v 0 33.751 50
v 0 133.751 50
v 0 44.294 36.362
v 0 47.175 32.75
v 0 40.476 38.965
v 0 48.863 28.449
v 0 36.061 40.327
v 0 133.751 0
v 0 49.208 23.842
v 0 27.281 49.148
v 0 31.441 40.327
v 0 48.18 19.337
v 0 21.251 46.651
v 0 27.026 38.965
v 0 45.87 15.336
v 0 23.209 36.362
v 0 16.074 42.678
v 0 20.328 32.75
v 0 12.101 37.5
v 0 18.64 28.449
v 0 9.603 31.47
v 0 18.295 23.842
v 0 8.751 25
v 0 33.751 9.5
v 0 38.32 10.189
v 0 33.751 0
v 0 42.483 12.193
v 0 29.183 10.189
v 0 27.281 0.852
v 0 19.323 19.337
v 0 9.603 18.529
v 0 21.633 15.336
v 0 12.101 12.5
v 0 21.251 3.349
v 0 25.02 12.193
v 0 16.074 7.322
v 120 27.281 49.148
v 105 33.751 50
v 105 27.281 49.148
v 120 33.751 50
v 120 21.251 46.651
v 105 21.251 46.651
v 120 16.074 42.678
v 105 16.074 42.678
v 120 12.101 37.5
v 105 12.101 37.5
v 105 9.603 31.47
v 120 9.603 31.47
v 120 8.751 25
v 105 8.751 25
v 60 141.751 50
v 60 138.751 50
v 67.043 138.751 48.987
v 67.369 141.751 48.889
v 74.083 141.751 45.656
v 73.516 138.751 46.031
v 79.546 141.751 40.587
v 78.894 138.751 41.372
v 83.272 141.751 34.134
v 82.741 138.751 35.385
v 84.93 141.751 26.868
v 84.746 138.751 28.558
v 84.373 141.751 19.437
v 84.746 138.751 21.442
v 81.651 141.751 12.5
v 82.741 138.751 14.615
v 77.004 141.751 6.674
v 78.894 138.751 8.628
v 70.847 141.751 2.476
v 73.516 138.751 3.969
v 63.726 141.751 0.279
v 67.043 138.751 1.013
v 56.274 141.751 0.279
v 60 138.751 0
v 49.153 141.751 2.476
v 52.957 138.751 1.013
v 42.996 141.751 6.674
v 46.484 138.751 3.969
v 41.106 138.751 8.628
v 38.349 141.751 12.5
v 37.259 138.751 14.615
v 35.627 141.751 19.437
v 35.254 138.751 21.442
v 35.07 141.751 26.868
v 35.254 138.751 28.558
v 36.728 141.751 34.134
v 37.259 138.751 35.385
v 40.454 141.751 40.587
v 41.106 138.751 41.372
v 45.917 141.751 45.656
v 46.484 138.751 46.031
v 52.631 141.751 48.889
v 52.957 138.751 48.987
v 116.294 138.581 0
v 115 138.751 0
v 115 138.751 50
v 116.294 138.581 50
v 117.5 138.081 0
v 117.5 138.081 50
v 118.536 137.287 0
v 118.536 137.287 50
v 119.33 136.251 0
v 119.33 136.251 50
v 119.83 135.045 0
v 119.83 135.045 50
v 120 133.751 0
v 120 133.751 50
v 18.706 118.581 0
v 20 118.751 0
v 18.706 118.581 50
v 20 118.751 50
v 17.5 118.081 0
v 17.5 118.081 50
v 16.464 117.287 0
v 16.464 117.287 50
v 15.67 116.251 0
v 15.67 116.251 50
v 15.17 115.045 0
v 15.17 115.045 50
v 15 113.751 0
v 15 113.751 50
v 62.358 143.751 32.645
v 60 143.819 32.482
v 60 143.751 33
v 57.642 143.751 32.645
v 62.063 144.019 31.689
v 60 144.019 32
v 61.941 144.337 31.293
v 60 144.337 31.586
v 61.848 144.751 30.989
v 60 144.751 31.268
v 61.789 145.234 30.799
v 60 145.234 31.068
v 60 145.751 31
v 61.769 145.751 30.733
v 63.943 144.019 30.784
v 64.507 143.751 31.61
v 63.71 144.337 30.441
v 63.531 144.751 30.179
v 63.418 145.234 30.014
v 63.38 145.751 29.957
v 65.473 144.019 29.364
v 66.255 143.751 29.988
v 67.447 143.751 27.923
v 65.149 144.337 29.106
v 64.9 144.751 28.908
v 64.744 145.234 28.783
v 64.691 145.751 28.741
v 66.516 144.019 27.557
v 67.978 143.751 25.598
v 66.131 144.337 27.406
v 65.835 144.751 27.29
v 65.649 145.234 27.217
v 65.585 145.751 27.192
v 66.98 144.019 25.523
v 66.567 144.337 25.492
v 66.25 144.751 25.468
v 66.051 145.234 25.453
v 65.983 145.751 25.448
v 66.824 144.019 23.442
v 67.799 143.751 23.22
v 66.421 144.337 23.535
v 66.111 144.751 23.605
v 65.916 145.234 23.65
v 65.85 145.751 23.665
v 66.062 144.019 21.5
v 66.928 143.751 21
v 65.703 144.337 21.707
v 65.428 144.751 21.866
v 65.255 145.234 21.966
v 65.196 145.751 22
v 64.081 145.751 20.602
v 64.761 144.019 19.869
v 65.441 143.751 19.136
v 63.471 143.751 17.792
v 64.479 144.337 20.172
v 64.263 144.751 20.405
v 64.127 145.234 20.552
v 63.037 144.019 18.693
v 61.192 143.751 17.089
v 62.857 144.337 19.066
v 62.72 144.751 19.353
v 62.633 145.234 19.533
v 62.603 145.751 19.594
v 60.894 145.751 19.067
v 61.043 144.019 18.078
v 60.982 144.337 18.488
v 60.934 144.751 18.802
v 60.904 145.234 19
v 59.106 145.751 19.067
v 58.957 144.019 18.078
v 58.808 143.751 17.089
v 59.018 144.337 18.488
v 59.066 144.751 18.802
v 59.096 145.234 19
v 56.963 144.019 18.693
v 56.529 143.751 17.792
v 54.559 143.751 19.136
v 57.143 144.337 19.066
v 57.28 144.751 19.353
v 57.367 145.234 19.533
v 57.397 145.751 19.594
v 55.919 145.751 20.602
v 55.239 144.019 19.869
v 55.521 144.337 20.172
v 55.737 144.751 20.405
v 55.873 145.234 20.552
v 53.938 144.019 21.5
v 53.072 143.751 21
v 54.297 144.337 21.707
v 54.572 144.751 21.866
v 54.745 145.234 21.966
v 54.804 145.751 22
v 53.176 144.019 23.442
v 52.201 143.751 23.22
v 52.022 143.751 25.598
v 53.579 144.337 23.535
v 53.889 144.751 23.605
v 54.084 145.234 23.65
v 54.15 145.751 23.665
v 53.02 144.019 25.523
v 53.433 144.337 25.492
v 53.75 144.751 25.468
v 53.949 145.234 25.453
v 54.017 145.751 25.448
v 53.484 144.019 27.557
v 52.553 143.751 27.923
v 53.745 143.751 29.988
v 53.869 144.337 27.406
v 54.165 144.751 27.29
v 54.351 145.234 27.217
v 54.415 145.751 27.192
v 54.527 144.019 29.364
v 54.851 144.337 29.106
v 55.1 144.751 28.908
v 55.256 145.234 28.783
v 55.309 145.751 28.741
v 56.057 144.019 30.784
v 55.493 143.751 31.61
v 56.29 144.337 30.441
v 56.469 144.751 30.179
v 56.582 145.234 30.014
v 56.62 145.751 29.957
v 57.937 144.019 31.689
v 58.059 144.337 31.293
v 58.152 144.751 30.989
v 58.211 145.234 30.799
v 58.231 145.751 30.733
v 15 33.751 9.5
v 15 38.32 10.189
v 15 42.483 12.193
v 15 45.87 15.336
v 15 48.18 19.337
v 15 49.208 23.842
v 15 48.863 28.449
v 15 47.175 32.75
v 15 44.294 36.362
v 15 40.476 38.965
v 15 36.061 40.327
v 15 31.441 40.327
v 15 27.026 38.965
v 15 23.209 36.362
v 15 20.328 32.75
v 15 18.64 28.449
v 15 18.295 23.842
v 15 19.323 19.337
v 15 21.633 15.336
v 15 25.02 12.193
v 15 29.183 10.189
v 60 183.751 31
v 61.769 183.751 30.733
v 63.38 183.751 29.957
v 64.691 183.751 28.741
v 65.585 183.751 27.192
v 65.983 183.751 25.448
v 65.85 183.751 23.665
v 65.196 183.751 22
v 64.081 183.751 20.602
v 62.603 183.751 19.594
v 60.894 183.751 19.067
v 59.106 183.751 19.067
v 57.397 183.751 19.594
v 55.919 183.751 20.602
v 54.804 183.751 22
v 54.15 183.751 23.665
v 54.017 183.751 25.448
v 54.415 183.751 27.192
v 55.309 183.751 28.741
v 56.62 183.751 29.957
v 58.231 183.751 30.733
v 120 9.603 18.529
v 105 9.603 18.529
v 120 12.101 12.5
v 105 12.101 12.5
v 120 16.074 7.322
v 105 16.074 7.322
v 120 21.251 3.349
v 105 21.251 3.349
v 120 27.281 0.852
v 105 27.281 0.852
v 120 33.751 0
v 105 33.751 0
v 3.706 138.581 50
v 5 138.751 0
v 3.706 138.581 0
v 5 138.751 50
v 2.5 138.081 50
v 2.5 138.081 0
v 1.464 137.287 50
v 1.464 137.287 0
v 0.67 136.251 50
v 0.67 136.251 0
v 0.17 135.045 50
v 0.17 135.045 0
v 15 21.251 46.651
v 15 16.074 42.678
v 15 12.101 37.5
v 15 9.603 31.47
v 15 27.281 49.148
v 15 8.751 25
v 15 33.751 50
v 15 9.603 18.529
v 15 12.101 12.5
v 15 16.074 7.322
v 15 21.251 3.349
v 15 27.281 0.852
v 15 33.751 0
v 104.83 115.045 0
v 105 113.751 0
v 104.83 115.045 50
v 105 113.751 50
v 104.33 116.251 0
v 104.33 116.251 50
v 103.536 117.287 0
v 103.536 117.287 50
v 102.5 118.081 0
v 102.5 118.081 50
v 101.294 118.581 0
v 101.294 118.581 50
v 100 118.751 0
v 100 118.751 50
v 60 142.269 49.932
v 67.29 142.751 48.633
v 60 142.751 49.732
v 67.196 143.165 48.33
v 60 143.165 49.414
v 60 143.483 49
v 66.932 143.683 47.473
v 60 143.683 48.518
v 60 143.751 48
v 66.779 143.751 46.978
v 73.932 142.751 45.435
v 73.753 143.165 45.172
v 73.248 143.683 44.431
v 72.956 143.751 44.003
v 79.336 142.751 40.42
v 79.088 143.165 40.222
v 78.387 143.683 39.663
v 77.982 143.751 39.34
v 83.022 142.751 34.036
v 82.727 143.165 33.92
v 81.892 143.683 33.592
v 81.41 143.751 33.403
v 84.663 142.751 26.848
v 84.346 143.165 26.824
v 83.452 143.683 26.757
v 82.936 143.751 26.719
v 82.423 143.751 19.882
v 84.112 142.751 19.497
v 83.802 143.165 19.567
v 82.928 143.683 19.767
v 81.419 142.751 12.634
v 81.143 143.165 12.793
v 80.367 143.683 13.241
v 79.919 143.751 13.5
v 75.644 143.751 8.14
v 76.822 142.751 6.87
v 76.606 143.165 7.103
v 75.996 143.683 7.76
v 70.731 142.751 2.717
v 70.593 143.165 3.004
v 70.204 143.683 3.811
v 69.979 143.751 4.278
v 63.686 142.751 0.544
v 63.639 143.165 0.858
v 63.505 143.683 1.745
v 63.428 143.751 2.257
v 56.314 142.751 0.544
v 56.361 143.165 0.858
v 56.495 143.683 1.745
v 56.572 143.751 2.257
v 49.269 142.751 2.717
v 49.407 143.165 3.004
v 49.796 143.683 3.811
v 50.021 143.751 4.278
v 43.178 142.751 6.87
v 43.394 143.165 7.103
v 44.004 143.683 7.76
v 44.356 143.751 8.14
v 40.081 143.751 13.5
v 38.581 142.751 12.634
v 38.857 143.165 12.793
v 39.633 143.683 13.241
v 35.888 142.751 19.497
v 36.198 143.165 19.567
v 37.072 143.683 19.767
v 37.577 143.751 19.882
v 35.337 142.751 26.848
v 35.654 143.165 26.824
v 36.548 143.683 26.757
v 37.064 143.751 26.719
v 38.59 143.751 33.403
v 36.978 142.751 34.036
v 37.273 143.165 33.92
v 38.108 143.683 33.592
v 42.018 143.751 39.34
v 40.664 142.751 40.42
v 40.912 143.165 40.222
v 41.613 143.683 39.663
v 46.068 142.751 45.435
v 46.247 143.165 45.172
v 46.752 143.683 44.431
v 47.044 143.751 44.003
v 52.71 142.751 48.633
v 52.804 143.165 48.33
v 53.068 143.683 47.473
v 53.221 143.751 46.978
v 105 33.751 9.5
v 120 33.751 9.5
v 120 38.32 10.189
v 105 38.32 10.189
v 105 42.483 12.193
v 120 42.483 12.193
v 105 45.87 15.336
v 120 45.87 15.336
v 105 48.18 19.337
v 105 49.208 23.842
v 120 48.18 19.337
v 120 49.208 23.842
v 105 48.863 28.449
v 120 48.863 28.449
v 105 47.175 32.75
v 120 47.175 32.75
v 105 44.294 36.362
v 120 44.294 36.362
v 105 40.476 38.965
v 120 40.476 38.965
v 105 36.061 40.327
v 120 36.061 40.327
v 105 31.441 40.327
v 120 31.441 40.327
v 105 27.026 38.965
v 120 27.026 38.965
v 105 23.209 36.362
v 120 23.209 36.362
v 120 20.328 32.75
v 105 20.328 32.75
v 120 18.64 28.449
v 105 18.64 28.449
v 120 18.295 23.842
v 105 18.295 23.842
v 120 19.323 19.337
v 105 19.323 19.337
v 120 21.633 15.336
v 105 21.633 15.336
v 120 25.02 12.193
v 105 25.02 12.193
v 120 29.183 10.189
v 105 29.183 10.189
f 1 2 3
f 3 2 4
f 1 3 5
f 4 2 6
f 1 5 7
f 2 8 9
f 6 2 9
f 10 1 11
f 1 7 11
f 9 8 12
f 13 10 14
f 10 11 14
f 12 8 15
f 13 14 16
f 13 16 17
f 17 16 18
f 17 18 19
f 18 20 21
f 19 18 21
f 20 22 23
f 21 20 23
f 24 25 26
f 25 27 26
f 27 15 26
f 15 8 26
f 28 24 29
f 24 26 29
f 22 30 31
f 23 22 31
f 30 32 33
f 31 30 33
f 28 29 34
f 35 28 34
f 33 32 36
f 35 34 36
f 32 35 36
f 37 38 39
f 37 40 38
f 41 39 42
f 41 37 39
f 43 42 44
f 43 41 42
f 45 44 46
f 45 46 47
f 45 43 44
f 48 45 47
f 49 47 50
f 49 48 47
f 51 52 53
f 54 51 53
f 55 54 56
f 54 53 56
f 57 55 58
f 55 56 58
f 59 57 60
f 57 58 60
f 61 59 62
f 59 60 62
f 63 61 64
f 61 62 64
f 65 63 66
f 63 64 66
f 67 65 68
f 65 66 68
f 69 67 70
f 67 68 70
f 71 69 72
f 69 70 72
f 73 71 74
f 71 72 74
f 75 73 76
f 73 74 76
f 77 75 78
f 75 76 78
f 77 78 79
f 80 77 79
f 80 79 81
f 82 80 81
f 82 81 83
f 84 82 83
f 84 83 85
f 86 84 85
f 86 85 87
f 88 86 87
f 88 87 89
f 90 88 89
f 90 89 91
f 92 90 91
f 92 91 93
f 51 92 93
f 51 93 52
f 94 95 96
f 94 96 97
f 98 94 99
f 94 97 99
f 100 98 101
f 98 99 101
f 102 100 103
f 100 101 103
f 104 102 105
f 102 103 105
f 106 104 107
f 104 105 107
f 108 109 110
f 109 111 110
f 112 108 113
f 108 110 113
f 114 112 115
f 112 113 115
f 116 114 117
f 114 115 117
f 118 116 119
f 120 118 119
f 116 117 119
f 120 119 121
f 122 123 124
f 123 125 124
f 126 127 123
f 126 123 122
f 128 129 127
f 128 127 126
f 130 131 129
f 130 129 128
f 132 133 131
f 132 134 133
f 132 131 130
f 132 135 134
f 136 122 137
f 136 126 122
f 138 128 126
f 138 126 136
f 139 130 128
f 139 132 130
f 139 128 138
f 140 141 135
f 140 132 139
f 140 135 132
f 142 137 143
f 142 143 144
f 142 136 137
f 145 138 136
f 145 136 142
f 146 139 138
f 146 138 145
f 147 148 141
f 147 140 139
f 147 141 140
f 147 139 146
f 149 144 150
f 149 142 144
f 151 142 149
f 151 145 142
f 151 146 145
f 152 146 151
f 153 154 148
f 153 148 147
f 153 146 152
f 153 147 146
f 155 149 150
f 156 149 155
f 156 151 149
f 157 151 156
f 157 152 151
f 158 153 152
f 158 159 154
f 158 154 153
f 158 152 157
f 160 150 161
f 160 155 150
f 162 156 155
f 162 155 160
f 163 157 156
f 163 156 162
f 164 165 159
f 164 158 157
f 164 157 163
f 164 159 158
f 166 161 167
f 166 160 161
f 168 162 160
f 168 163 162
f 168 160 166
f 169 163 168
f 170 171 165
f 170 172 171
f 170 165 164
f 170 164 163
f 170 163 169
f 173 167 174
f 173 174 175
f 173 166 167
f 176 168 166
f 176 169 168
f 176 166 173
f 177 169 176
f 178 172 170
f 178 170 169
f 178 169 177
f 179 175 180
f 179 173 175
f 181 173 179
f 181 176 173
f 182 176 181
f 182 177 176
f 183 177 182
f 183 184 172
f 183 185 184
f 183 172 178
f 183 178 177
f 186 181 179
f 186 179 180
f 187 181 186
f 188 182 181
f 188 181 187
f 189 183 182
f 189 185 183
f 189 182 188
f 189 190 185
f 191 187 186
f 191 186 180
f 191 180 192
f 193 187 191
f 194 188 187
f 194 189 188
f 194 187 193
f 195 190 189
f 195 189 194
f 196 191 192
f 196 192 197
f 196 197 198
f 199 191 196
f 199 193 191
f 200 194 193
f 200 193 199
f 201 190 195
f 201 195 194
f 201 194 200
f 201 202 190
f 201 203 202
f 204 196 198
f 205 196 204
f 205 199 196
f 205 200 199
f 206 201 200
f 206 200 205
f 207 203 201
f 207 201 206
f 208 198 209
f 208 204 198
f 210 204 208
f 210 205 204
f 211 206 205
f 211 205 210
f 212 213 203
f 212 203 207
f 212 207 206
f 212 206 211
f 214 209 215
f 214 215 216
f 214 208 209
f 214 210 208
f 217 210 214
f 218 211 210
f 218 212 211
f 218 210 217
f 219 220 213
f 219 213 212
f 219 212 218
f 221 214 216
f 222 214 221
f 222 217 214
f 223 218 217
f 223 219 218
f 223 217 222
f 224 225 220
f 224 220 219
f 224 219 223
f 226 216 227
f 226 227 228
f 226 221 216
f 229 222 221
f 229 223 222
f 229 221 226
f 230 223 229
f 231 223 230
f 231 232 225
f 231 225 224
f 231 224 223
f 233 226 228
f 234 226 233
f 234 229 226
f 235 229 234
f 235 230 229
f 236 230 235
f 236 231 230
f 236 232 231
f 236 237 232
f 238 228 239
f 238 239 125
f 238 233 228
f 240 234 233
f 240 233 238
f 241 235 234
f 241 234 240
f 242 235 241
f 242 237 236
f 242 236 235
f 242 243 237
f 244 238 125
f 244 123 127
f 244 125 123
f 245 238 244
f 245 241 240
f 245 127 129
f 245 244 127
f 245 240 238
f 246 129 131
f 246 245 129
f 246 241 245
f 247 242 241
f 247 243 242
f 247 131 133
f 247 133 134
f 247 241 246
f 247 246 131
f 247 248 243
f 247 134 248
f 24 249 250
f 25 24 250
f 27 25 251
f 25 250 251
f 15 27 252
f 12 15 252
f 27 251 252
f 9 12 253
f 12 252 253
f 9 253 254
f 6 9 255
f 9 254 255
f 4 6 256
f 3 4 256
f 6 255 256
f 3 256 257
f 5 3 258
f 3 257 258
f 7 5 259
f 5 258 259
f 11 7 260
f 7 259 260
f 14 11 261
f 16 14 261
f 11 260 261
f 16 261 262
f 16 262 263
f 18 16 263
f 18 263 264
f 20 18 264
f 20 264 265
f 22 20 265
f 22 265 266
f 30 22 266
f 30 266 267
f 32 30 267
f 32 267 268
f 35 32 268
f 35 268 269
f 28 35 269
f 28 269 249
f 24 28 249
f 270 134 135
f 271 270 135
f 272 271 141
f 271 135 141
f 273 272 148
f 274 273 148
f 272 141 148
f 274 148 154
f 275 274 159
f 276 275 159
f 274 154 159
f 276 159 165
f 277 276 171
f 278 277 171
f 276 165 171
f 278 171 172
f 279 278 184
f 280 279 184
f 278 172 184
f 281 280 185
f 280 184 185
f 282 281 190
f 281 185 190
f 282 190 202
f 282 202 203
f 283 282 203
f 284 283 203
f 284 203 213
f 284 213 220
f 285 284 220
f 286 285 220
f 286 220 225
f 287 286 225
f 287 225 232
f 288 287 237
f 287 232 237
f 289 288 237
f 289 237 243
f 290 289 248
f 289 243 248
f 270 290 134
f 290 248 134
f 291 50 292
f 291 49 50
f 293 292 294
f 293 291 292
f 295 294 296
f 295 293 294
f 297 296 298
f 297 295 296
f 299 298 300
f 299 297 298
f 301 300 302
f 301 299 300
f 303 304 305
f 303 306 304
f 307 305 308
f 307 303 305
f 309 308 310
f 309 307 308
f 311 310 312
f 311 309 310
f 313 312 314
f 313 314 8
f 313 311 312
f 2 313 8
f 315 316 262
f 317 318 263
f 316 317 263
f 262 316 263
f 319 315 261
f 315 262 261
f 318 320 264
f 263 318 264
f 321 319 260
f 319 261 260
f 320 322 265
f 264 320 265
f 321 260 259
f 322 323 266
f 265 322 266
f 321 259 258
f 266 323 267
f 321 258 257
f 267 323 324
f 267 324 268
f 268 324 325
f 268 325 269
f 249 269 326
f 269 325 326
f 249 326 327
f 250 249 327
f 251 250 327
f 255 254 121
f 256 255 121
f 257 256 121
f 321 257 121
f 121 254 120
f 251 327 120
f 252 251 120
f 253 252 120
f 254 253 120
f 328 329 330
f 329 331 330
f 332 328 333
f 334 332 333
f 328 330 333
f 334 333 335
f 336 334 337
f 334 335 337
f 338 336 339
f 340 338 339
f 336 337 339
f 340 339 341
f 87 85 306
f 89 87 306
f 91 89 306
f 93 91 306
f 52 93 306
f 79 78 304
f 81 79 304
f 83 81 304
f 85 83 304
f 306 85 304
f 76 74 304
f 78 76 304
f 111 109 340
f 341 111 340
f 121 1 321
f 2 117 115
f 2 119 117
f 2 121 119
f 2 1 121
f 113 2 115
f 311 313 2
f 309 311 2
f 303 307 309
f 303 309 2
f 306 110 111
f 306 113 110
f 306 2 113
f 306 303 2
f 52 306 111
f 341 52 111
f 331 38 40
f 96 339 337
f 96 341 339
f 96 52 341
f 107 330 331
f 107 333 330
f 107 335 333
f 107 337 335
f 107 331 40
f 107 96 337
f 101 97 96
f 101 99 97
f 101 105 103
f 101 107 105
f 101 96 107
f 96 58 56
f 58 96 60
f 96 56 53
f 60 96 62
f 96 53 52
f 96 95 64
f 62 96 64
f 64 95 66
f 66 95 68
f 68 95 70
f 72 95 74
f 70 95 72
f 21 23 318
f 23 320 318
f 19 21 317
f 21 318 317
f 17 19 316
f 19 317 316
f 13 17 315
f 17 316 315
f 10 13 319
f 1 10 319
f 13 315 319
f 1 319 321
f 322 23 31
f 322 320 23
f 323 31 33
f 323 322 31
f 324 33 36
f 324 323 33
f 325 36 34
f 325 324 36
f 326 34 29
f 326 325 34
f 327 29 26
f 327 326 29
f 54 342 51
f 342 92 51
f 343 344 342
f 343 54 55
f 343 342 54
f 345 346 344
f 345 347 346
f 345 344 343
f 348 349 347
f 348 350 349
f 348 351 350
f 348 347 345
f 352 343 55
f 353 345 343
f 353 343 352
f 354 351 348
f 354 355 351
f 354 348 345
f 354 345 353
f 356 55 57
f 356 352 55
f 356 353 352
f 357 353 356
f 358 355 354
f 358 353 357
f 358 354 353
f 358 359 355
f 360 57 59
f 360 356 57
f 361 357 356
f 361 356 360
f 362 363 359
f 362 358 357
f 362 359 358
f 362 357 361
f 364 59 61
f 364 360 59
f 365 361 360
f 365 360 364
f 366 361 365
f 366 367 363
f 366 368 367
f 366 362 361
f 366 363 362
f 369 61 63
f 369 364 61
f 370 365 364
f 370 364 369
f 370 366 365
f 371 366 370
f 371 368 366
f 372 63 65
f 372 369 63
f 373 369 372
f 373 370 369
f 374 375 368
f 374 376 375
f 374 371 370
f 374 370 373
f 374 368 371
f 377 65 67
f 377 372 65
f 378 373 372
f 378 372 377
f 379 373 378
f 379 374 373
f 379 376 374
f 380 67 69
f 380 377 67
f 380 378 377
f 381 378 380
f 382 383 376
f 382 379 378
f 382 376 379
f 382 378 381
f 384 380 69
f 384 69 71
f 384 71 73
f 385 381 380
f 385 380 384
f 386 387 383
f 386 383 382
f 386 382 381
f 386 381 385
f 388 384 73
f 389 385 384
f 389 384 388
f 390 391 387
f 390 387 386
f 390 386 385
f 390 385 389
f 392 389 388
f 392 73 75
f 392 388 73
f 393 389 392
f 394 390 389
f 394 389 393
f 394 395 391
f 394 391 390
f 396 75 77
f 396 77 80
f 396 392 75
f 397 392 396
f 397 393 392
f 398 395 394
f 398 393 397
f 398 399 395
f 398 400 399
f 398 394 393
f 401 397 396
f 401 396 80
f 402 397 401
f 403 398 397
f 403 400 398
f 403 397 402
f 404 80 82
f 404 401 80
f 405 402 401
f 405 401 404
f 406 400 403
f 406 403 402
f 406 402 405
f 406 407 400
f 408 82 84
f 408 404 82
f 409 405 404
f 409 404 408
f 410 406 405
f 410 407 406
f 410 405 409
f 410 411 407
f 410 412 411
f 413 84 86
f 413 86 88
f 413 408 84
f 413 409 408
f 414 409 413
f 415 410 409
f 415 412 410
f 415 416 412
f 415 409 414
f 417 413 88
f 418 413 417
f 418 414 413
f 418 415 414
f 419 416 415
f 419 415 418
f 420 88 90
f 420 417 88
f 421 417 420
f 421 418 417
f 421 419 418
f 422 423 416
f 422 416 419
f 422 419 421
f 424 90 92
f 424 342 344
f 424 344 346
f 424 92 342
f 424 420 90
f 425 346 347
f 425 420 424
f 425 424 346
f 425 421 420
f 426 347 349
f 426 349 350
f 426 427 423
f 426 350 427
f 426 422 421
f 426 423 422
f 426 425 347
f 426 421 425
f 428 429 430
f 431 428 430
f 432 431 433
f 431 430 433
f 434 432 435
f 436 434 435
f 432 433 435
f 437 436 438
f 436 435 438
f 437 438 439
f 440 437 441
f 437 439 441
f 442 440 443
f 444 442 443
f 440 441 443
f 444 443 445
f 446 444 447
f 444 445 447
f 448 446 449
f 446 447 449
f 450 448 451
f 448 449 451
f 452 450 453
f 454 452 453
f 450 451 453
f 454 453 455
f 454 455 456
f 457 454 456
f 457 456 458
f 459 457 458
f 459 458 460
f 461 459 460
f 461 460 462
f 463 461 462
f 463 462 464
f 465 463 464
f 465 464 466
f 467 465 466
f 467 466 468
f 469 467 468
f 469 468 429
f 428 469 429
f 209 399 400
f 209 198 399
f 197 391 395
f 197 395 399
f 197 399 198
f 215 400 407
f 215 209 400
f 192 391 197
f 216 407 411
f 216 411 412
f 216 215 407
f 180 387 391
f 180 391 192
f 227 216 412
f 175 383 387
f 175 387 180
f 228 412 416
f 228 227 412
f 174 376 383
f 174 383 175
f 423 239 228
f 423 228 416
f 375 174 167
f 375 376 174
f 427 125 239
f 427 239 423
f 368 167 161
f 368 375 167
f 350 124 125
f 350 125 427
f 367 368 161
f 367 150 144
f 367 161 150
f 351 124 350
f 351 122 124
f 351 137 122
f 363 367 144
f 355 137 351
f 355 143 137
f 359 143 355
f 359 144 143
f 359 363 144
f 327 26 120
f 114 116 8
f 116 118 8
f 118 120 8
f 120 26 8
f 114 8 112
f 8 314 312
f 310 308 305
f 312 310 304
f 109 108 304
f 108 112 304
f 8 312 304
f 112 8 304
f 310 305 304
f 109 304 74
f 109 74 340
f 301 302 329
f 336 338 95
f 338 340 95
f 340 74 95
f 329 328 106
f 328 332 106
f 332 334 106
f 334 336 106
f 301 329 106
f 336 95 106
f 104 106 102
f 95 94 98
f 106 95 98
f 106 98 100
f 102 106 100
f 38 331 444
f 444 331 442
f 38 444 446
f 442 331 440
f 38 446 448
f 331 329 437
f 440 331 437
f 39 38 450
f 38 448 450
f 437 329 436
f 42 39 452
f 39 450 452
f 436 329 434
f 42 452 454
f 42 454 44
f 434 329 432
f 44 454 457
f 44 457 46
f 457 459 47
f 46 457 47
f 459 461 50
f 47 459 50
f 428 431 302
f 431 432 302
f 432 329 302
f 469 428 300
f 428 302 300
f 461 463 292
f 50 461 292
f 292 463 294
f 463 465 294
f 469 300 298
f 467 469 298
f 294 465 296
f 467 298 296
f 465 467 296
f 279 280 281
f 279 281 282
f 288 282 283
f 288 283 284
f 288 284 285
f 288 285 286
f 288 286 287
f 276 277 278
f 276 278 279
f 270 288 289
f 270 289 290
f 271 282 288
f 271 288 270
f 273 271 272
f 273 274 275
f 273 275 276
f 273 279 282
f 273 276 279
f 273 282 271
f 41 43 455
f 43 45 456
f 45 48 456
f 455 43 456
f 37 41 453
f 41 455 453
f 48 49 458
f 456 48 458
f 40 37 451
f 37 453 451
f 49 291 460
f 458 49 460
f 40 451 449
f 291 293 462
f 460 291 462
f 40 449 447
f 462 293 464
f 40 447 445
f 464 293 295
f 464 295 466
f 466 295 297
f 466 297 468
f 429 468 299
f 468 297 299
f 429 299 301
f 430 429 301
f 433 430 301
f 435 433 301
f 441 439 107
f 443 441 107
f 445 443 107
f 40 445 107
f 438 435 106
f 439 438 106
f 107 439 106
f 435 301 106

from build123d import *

# Parameters (mm, degrees)
BOSS_EXTRUDE1_DEPTH = 50
FILLET2_R           = 25
FILLET3_R           = 25
FILLET4_R           = 25
FILLET5_R           = 25
SKETCH2_R           = 15.5
CUT_EXTRUDE1_DEPTH  = 191.136542592
SKETCH3_R           = 25
BOSS_EXTRUDE2_DEPTH = 5
SKETCH4_R           = 6
BOSS_EXTRUDE3_DEPTH = 40
FILLET6_R           = 2
FILLET7_R           = 5


with BuildPart() as part:
    # Sketch1 → Boss-Extrude1 (new body)
    with BuildSketch(Plane.XY):
        Polygon((15, 8.751233612), (15, 118.751233612), (105, 118.751233612), (105, 8.751233612), (120, 8.751233612), (120, 138.751233612), (0, 138.751233612), (0, 8.751233612), align=None)
    extrude(amount=BOSS_EXTRUDE1_DEPTH)

    # Fillet2
    fillet2_edges = [part.edges().sort_by_distance(p)[0] for p in [
        (7.5, 8.751233612, 50),
    ]]
    fillet(fillet2_edges, radius=FILLET2_R)

    # Fillet3
    fillet3_edges = [part.edges().sort_by_distance(p)[0] for p in [
        (7.5, 8.751233612, 0),
    ]]
    fillet(fillet3_edges, radius=FILLET3_R - 0.0001)  # a hair under: the kernel refuses the full size

    # Fillet4
    fillet4_edges = [part.edges().sort_by_distance(p)[0] for p in [
        (112.5, 8.751233612, 50),
    ]]
    fillet(fillet4_edges, radius=FILLET4_R)

    # Fillet5
    fillet5_edges = [part.edges().sort_by_distance(p)[0] for p in [
        (112.5, 8.751233612, 0),
    ]]
    fillet(fillet5_edges, radius=FILLET5_R - 0.0001)  # a hair under: the kernel refuses the full size

    # Sketch2 → Cut-Extrude1 (cut, through all)
    with BuildSketch(Plane(origin=(120, 0, 0), x_dir=(0, 0, -1), z_dir=(1, 0, 0))):
        with Locations((-25, 33.751233612)):
            Circle(SKETCH2_R)
    extrude(amount=-CUT_EXTRUDE1_DEPTH, mode=Mode.SUBTRACT)

    # Sketch3 → Boss-Extrude2 (add)
    with BuildSketch(Plane(origin=(0, 138.751233612, 0), x_dir=(1, 0, 0), z_dir=(0, 1, 0))):
        with Locations(Location((60, -25, 0), (0, 0, 270))):
            Circle(SKETCH3_R)
    extrude(amount=BOSS_EXTRUDE2_DEPTH)

    # Sketch4 → Boss-Extrude3 (add)
    with BuildSketch(Plane(origin=(0, 143.751233612, 0), x_dir=(1, 0, 0), z_dir=(0, 1, 0))):
        with Locations(Location((60, -25, 0), (0, 0, 270))):
            Circle(SKETCH4_R)
    extrude(amount=BOSS_EXTRUDE3_DEPTH)

    # Fillet6
    fillet6_edges = [part.edges().sort_by_distance(p)[0] for p in [
        (60, 143.751233612, 0),
        (60, 143.751233612, 19),
    ]]
    fillet(fillet6_edges, radius=FILLET6_R)

    # Fillet7
    fillet7_edges = [part.edges().sort_by_distance(p)[0] for p in [
        (15, 118.751233612, 25),
        (0, 138.751233612, 25),
        (120, 138.751233612, 25),
        (105, 118.751233612, 25),
    ]]
    fillet(fillet7_edges, radius=FILLET7_R)


solid = part.part
